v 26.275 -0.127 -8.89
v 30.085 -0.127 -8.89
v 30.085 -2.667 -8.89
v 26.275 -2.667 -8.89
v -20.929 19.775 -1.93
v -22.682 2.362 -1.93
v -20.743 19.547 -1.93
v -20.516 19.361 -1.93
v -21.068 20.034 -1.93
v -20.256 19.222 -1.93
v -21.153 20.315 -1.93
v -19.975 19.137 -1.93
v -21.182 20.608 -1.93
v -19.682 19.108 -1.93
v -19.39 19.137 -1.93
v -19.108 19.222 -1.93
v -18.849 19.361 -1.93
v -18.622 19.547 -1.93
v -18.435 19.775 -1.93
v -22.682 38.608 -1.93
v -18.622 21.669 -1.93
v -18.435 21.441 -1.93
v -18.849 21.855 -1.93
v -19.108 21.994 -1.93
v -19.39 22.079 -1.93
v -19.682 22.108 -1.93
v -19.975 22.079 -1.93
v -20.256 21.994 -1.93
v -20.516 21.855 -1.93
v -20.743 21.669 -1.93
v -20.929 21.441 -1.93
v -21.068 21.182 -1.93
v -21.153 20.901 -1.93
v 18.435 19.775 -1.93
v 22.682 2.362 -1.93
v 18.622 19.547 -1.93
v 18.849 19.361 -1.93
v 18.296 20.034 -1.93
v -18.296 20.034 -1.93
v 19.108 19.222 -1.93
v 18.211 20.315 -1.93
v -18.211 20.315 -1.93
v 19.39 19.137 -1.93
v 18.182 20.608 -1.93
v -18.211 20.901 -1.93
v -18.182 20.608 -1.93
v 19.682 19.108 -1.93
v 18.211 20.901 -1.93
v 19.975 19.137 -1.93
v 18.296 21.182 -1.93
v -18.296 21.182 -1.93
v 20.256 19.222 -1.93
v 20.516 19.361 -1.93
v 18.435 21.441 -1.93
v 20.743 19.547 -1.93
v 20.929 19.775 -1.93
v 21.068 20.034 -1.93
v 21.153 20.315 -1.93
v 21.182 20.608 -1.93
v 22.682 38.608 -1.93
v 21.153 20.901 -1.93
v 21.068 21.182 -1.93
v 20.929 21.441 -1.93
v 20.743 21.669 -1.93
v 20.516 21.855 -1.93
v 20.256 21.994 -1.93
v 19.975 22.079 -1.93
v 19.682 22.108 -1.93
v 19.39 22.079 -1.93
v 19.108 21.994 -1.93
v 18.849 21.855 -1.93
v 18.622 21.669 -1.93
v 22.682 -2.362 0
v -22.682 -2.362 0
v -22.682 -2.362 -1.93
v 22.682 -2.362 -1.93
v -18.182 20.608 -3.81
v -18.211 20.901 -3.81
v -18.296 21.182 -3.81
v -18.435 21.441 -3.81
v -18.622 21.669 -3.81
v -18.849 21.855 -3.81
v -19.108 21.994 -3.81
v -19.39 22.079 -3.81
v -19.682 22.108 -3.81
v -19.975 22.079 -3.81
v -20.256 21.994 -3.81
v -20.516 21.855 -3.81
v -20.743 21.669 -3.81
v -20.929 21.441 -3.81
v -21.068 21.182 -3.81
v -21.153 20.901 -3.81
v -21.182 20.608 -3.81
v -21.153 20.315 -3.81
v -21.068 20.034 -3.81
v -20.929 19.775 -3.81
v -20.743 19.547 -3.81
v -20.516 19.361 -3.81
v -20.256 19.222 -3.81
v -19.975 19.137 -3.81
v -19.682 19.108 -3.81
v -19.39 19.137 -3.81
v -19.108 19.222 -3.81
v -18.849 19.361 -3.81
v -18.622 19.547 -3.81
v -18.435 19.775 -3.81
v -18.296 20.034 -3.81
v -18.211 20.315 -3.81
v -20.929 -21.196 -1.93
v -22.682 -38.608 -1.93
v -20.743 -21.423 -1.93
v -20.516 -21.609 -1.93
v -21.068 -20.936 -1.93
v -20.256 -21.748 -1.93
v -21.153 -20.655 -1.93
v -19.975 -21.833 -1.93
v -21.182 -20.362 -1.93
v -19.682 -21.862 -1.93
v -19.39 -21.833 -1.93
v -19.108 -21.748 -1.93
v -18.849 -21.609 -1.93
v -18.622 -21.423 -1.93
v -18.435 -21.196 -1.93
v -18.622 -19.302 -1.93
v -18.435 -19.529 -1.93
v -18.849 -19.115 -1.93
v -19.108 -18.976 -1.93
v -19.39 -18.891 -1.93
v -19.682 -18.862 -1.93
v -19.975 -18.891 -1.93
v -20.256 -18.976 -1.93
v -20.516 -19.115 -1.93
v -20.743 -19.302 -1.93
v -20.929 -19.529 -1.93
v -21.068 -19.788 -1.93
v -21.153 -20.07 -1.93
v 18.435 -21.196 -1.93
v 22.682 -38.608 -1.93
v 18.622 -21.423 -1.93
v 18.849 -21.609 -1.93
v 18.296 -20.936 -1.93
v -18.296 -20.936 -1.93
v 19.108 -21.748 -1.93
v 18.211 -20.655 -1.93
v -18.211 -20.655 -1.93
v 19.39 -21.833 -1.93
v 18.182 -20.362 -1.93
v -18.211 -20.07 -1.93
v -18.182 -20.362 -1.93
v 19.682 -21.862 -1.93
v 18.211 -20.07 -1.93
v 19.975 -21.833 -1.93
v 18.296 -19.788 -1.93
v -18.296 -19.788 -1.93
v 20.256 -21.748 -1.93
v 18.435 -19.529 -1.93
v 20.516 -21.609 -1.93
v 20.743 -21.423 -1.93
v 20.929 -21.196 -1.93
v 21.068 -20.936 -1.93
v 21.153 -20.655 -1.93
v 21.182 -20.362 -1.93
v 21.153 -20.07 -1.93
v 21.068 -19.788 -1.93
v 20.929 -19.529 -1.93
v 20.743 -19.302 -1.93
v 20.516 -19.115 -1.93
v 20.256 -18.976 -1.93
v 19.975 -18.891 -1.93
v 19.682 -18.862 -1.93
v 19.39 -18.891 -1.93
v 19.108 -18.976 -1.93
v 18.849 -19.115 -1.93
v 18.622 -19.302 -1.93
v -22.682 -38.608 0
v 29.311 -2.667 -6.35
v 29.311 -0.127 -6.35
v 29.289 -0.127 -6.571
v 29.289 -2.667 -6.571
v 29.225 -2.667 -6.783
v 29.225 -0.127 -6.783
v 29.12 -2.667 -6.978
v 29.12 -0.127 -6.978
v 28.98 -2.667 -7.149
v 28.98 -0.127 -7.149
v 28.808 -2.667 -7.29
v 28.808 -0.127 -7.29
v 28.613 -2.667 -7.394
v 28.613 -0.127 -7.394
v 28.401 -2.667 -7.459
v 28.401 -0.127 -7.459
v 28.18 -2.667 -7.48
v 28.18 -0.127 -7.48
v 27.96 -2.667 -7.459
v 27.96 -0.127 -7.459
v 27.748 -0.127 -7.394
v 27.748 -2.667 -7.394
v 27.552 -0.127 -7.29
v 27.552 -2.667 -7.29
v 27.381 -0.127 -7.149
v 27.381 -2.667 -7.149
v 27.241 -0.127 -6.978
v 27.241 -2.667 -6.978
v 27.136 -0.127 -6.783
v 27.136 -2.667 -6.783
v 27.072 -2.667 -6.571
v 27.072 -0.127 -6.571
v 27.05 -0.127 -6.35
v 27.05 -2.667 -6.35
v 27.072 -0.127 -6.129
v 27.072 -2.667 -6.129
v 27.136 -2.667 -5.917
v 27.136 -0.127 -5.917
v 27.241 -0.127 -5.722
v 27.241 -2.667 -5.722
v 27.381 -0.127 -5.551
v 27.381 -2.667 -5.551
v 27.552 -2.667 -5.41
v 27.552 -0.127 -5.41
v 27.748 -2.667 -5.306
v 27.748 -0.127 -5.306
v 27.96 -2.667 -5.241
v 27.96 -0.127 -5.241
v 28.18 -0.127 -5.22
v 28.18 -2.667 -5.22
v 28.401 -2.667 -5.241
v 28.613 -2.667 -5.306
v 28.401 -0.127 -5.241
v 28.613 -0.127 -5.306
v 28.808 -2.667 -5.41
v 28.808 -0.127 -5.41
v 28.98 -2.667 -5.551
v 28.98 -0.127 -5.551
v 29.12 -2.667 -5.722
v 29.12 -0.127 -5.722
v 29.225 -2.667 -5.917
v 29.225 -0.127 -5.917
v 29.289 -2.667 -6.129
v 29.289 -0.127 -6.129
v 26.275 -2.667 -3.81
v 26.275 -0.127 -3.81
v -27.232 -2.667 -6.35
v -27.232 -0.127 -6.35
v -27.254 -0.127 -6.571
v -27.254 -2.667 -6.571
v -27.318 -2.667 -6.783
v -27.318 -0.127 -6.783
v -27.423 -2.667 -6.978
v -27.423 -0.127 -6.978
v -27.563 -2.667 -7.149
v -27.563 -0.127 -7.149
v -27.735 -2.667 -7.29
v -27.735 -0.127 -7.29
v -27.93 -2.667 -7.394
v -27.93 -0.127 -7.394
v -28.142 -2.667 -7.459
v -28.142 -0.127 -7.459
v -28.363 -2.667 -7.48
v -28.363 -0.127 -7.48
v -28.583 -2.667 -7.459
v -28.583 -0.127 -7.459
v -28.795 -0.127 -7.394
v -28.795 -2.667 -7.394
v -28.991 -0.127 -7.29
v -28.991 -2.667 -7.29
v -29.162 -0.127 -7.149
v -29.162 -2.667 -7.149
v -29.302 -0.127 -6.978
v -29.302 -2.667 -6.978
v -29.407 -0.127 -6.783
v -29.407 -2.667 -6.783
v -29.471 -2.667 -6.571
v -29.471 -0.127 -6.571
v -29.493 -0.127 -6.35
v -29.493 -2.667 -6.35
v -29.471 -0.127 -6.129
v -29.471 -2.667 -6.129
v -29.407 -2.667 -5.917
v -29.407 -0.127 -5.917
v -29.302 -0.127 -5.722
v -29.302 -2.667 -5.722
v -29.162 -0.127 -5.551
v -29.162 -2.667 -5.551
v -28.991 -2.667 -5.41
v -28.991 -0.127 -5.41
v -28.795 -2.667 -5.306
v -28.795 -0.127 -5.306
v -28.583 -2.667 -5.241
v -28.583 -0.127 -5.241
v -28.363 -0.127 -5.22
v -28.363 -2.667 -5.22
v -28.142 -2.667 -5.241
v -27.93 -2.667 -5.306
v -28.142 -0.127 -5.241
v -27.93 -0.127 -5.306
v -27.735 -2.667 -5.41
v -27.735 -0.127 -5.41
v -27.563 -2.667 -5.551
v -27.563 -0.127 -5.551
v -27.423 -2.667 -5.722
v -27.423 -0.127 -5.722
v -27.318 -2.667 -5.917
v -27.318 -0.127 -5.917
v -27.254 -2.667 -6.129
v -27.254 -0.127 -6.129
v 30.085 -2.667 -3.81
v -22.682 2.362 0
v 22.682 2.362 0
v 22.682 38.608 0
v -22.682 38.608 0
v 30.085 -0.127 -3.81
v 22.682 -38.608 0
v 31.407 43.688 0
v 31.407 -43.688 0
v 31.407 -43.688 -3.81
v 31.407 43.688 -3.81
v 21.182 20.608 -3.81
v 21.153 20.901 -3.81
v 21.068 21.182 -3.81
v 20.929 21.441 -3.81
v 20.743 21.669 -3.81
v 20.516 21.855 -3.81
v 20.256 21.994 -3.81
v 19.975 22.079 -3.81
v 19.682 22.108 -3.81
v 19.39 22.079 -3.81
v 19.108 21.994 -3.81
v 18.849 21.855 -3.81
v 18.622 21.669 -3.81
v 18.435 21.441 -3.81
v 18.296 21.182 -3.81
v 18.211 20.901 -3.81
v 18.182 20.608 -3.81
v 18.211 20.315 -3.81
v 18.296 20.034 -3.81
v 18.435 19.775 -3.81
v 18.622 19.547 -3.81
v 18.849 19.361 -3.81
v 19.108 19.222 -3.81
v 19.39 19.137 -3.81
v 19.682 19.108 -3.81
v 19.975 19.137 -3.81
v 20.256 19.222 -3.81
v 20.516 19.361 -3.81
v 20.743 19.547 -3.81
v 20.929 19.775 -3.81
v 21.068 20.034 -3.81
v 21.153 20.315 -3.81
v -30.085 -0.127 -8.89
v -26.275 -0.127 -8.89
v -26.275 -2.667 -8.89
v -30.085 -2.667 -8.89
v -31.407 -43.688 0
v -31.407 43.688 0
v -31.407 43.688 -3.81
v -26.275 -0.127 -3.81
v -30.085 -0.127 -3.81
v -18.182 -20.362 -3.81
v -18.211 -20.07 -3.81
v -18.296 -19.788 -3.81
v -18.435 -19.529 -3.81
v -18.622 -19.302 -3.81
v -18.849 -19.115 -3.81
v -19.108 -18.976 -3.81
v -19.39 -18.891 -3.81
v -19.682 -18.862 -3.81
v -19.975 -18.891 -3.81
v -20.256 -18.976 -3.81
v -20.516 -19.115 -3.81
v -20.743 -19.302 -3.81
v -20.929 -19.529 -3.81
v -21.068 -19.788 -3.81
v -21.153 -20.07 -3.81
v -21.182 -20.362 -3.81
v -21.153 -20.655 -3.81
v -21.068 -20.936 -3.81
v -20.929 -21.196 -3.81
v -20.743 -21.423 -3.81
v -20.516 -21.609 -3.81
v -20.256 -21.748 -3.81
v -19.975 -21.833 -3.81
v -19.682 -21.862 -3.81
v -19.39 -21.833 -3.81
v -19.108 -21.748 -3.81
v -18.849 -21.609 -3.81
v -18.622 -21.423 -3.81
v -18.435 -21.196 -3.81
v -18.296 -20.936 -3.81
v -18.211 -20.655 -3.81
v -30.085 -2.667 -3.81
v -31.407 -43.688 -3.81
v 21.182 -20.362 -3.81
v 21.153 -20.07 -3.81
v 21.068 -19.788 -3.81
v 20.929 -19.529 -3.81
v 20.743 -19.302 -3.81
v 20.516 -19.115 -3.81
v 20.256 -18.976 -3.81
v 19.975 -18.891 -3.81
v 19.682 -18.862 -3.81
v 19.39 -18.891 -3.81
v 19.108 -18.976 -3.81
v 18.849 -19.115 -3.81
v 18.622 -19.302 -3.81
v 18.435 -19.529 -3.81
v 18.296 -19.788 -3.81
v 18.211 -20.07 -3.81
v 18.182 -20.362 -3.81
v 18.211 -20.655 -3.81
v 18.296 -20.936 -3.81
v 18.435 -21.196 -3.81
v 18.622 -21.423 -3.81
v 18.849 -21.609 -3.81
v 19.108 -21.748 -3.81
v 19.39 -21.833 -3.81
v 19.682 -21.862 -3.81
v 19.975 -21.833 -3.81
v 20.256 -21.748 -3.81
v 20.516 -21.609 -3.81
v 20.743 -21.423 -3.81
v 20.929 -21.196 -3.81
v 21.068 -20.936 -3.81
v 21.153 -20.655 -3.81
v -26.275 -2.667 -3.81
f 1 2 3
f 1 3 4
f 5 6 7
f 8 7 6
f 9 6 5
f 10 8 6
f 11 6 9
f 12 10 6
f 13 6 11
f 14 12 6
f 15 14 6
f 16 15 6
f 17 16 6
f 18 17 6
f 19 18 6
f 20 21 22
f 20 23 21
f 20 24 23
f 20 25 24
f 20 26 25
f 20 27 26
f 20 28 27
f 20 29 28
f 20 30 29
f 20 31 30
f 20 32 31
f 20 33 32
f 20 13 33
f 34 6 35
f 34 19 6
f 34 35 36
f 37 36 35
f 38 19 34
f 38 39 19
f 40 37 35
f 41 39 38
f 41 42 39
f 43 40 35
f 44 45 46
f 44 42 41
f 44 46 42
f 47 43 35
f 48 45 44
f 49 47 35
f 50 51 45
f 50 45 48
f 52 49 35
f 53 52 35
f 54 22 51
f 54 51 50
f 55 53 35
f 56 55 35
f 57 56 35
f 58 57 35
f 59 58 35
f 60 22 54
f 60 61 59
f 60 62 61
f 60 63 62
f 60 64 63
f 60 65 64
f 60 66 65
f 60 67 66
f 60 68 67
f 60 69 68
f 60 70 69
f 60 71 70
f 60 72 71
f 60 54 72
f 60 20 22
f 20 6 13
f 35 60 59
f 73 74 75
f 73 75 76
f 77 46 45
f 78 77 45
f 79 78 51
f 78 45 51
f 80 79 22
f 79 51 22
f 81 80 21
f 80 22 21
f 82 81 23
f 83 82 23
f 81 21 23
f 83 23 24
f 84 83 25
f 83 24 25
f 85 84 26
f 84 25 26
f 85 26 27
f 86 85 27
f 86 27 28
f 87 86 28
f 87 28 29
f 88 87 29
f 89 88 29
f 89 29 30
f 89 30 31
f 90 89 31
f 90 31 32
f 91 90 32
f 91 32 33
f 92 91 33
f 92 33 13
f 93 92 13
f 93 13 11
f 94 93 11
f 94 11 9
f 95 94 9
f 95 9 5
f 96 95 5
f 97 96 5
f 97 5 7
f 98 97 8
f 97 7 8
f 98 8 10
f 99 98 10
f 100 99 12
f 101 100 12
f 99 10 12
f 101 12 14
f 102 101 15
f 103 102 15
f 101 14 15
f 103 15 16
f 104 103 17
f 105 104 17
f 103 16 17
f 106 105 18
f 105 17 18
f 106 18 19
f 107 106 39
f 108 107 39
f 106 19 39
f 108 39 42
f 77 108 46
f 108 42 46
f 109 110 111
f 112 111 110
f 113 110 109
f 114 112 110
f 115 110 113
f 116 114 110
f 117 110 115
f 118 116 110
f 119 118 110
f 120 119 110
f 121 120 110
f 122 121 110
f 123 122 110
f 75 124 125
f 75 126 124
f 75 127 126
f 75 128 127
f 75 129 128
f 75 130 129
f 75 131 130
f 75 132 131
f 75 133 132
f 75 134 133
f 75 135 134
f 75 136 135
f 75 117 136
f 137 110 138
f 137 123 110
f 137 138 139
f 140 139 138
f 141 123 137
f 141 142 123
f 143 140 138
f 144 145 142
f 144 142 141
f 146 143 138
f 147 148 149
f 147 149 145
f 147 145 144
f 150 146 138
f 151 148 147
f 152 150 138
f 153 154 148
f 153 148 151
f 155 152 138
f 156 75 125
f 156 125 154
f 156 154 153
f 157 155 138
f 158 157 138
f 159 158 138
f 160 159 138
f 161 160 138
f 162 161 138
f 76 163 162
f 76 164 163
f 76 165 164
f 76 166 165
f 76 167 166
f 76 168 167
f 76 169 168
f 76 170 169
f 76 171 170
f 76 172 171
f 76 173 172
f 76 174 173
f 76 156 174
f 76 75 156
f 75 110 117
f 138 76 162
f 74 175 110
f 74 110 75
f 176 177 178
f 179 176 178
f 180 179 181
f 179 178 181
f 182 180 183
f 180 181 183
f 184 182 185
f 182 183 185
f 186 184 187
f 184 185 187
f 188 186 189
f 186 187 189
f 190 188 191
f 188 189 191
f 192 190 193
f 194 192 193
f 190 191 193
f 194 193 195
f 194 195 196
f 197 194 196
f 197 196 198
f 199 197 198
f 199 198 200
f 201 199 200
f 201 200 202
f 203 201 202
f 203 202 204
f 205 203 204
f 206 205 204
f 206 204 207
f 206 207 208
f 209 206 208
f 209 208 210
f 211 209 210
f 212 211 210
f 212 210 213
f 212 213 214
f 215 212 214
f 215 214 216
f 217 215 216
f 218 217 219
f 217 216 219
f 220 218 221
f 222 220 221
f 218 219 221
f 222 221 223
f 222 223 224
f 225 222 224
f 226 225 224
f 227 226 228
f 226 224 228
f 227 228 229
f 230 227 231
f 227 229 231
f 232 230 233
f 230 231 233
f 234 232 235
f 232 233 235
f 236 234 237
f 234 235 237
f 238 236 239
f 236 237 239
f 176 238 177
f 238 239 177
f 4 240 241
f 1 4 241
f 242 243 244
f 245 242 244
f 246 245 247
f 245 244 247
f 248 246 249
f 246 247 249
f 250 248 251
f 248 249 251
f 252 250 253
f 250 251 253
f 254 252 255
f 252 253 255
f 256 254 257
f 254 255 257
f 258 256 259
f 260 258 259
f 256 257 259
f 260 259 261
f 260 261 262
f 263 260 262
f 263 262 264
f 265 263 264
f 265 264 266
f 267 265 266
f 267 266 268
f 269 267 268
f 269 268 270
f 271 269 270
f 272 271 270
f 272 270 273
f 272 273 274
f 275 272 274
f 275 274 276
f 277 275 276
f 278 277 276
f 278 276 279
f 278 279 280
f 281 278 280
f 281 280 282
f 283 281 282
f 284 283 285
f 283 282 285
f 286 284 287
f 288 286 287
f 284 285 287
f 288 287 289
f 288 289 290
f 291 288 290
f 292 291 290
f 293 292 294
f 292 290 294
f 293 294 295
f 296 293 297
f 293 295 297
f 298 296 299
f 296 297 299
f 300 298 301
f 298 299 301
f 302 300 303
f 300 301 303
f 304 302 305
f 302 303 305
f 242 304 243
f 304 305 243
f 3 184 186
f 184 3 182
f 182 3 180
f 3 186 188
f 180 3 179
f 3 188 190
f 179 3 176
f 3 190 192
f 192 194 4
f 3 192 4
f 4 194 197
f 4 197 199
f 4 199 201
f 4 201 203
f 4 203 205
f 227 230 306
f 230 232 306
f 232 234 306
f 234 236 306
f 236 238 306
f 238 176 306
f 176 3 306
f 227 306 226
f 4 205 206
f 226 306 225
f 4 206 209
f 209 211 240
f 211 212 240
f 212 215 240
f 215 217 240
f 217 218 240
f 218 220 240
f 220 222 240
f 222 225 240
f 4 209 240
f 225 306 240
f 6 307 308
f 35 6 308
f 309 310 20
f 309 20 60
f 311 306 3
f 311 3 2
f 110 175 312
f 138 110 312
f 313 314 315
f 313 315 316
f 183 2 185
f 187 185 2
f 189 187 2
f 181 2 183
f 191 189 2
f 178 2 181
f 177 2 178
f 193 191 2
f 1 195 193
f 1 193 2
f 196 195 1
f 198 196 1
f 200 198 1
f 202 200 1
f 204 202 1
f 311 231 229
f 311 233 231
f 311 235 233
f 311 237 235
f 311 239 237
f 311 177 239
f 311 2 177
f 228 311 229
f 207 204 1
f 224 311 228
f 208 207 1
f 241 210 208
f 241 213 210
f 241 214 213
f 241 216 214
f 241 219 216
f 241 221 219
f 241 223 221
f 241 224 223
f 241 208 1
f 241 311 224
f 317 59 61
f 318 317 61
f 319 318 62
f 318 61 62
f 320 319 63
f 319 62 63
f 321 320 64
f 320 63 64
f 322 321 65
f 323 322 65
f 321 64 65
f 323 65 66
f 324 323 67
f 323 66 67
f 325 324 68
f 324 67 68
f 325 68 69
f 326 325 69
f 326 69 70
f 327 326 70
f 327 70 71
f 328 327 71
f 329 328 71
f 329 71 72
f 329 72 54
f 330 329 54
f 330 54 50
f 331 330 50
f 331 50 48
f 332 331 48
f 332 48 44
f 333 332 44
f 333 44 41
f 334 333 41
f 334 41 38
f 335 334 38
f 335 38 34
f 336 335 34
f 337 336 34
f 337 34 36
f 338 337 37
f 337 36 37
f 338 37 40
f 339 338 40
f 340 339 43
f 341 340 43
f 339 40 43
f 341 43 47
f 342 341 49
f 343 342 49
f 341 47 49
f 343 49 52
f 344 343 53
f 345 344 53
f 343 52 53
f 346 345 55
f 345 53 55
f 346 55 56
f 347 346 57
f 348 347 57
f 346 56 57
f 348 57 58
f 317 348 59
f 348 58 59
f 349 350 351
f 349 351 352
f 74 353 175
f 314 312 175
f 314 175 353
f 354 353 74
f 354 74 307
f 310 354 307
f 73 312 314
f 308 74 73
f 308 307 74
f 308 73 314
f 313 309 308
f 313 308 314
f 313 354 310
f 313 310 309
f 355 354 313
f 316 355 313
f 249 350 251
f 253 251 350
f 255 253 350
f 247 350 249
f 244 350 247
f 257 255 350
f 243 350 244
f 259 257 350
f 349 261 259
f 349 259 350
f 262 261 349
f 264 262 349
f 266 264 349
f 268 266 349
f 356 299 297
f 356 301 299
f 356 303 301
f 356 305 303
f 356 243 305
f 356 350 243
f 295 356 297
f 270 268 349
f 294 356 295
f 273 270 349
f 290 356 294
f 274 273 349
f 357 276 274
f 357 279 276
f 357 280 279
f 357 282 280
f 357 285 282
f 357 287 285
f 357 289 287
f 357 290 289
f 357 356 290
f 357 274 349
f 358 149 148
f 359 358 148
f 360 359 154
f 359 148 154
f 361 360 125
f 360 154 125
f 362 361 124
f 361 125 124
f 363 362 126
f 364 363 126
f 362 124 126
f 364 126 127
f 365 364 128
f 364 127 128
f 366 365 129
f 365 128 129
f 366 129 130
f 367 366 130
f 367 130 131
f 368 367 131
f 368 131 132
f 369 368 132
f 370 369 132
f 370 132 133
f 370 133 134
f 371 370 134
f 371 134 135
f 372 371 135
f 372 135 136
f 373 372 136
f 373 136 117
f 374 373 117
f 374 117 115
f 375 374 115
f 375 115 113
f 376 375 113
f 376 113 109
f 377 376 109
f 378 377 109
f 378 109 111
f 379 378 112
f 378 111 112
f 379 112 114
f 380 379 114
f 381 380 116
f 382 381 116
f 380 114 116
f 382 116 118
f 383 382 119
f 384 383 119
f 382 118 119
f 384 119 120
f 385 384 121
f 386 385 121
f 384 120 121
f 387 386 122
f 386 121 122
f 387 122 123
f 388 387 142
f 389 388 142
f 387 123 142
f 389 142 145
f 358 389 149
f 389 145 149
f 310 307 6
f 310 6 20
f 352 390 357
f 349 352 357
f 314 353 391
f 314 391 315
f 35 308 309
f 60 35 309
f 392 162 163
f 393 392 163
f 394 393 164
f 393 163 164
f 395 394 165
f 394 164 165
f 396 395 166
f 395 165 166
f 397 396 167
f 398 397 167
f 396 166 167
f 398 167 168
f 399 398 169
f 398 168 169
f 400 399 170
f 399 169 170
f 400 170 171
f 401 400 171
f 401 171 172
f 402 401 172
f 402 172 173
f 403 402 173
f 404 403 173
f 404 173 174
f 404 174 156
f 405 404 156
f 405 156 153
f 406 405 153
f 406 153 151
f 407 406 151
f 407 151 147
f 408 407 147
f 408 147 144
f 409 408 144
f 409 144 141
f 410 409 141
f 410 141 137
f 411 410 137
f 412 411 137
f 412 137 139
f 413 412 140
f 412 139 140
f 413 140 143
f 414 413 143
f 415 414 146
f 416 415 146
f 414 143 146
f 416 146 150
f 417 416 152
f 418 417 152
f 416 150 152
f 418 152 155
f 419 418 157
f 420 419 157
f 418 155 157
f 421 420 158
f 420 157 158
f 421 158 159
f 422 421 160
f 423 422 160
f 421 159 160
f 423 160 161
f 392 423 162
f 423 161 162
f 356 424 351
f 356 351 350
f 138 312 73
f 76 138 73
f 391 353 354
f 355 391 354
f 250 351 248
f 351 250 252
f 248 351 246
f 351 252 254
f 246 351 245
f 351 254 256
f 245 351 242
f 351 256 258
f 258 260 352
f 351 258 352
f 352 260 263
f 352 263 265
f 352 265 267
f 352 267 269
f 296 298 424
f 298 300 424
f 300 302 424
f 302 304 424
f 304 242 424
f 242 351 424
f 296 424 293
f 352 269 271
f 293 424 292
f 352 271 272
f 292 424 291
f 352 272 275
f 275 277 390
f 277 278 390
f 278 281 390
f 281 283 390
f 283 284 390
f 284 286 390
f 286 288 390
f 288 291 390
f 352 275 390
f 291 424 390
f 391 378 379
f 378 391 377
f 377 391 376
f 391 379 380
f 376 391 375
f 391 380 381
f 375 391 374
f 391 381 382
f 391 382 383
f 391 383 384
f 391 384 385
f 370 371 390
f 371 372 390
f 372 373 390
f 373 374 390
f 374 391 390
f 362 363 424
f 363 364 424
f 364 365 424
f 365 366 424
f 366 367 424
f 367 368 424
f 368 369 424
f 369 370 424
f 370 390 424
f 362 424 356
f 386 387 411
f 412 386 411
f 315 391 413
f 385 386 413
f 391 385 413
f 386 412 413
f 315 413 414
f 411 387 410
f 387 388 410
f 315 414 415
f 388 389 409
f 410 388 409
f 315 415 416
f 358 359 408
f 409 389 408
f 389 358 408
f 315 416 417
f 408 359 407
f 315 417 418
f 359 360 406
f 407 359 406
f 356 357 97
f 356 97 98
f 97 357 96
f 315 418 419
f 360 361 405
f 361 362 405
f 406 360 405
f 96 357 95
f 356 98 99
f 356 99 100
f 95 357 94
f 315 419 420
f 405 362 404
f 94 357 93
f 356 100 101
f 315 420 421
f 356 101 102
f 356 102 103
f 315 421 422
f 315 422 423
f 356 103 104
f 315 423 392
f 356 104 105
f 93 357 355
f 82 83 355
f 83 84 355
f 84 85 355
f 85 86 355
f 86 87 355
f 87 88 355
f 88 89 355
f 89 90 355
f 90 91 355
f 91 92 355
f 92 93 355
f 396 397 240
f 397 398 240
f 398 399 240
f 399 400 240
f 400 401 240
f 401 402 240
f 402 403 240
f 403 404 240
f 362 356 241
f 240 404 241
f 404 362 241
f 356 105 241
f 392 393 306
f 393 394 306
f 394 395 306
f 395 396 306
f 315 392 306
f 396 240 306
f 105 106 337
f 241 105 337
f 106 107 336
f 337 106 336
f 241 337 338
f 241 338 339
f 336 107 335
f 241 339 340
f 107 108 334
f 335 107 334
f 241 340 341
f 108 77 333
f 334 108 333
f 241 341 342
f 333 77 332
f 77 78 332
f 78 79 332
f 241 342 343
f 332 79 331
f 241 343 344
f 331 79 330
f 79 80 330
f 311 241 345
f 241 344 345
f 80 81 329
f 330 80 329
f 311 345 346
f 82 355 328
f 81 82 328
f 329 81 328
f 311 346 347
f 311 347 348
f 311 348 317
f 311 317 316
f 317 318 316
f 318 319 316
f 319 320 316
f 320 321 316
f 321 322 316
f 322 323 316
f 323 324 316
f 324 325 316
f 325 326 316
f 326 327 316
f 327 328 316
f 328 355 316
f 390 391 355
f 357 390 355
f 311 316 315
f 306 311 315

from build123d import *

# Parameters (mm, degrees)
SKETCH12_W          = 62.8142
SKETCH12_H          = 87.376
BOSS_EXTRUDE5_DEPTH = 3.81
SKETCH22_W          = 3.81
SKETCH22_H          = 2.54
BOSS_EXTRUDE6_DEPTH = 5.08
SKETCH23_R          = 1.1303
CUT_EXTRUDE5_DEPTH  = 5.08
SKETCH25_W          = 45.3644
SKETCH25_H          = 36.2458
CUT_EXTRUDE6_DEPTH  = 1.9304
SKETCH26_R          = 1.5
CUT_EXTRUDE7_DEPTH  = 1.9304


with BuildPart() as part:
    # Sketch12 → Boss-Extrude5 (new body)
    with BuildSketch(Plane.XY):
        Rectangle(SKETCH12_W, SKETCH12_H)
    extrude(amount=-BOSS_EXTRUDE5_DEPTH)

    # Sketch22 → Boss-Extrude6 (add)
    with BuildSketch(Plane(origin=(0, 0, -3.81), x_dir=(-1, 0, 0), z_dir=(0, 0, -1))):
        with Locations((-28.1803602, -1.397)):
            Rectangle(SKETCH22_W, SKETCH22_H)
        with Locations((28.1803602, -1.397)):
            Rectangle(SKETCH22_W, SKETCH22_H)
    extrude(amount=BOSS_EXTRUDE6_DEPTH)

    # Sketch23 → Cut-Extrude5 (cut)
    with BuildSketch(Plane(origin=(0, -0.127, 0), x_dir=(1, 0, 0), z_dir=(0, 1, 0))):
        with Locations((28.1803602, 6.35)):
            Circle(SKETCH23_R)
        with Locations((-28.362608627, 6.35)):
            Circle(SKETCH23_R)
    extrude(amount=-CUT_EXTRUDE5_DEPTH, mode=Mode.SUBTRACT)

    # Sketch25 → Cut-Extrude6 (cut)
    with BuildSketch(Plane.XY):
        with Locations((0, 20.4851)):
            Rectangle(SKETCH25_W, SKETCH25_H)
        with Locations((0, -20.4851)):
            Rectangle(SKETCH25_W, SKETCH25_H)
    extrude(amount=-CUT_EXTRUDE6_DEPTH, mode=Mode.SUBTRACT)

    # Sketch26 → Cut-Extrude7 (cut)
    with BuildSketch(Plane.XY.offset(-1.9304)):
        with Locations((19.6822, 20.608)):
            Circle(SKETCH26_R)
        with Locations((19.6822, -20.3622)):
            Circle(SKETCH26_R)
        with Locations((-19.6822, -20.3622)):
            Circle(SKETCH26_R)
        with Locations((-19.6822, 20.608)):
            Circle(SKETCH26_R)
    extrude(amount=-CUT_EXTRUDE7_DEPTH, mode=Mode.SUBTRACT)


solid = part.part
